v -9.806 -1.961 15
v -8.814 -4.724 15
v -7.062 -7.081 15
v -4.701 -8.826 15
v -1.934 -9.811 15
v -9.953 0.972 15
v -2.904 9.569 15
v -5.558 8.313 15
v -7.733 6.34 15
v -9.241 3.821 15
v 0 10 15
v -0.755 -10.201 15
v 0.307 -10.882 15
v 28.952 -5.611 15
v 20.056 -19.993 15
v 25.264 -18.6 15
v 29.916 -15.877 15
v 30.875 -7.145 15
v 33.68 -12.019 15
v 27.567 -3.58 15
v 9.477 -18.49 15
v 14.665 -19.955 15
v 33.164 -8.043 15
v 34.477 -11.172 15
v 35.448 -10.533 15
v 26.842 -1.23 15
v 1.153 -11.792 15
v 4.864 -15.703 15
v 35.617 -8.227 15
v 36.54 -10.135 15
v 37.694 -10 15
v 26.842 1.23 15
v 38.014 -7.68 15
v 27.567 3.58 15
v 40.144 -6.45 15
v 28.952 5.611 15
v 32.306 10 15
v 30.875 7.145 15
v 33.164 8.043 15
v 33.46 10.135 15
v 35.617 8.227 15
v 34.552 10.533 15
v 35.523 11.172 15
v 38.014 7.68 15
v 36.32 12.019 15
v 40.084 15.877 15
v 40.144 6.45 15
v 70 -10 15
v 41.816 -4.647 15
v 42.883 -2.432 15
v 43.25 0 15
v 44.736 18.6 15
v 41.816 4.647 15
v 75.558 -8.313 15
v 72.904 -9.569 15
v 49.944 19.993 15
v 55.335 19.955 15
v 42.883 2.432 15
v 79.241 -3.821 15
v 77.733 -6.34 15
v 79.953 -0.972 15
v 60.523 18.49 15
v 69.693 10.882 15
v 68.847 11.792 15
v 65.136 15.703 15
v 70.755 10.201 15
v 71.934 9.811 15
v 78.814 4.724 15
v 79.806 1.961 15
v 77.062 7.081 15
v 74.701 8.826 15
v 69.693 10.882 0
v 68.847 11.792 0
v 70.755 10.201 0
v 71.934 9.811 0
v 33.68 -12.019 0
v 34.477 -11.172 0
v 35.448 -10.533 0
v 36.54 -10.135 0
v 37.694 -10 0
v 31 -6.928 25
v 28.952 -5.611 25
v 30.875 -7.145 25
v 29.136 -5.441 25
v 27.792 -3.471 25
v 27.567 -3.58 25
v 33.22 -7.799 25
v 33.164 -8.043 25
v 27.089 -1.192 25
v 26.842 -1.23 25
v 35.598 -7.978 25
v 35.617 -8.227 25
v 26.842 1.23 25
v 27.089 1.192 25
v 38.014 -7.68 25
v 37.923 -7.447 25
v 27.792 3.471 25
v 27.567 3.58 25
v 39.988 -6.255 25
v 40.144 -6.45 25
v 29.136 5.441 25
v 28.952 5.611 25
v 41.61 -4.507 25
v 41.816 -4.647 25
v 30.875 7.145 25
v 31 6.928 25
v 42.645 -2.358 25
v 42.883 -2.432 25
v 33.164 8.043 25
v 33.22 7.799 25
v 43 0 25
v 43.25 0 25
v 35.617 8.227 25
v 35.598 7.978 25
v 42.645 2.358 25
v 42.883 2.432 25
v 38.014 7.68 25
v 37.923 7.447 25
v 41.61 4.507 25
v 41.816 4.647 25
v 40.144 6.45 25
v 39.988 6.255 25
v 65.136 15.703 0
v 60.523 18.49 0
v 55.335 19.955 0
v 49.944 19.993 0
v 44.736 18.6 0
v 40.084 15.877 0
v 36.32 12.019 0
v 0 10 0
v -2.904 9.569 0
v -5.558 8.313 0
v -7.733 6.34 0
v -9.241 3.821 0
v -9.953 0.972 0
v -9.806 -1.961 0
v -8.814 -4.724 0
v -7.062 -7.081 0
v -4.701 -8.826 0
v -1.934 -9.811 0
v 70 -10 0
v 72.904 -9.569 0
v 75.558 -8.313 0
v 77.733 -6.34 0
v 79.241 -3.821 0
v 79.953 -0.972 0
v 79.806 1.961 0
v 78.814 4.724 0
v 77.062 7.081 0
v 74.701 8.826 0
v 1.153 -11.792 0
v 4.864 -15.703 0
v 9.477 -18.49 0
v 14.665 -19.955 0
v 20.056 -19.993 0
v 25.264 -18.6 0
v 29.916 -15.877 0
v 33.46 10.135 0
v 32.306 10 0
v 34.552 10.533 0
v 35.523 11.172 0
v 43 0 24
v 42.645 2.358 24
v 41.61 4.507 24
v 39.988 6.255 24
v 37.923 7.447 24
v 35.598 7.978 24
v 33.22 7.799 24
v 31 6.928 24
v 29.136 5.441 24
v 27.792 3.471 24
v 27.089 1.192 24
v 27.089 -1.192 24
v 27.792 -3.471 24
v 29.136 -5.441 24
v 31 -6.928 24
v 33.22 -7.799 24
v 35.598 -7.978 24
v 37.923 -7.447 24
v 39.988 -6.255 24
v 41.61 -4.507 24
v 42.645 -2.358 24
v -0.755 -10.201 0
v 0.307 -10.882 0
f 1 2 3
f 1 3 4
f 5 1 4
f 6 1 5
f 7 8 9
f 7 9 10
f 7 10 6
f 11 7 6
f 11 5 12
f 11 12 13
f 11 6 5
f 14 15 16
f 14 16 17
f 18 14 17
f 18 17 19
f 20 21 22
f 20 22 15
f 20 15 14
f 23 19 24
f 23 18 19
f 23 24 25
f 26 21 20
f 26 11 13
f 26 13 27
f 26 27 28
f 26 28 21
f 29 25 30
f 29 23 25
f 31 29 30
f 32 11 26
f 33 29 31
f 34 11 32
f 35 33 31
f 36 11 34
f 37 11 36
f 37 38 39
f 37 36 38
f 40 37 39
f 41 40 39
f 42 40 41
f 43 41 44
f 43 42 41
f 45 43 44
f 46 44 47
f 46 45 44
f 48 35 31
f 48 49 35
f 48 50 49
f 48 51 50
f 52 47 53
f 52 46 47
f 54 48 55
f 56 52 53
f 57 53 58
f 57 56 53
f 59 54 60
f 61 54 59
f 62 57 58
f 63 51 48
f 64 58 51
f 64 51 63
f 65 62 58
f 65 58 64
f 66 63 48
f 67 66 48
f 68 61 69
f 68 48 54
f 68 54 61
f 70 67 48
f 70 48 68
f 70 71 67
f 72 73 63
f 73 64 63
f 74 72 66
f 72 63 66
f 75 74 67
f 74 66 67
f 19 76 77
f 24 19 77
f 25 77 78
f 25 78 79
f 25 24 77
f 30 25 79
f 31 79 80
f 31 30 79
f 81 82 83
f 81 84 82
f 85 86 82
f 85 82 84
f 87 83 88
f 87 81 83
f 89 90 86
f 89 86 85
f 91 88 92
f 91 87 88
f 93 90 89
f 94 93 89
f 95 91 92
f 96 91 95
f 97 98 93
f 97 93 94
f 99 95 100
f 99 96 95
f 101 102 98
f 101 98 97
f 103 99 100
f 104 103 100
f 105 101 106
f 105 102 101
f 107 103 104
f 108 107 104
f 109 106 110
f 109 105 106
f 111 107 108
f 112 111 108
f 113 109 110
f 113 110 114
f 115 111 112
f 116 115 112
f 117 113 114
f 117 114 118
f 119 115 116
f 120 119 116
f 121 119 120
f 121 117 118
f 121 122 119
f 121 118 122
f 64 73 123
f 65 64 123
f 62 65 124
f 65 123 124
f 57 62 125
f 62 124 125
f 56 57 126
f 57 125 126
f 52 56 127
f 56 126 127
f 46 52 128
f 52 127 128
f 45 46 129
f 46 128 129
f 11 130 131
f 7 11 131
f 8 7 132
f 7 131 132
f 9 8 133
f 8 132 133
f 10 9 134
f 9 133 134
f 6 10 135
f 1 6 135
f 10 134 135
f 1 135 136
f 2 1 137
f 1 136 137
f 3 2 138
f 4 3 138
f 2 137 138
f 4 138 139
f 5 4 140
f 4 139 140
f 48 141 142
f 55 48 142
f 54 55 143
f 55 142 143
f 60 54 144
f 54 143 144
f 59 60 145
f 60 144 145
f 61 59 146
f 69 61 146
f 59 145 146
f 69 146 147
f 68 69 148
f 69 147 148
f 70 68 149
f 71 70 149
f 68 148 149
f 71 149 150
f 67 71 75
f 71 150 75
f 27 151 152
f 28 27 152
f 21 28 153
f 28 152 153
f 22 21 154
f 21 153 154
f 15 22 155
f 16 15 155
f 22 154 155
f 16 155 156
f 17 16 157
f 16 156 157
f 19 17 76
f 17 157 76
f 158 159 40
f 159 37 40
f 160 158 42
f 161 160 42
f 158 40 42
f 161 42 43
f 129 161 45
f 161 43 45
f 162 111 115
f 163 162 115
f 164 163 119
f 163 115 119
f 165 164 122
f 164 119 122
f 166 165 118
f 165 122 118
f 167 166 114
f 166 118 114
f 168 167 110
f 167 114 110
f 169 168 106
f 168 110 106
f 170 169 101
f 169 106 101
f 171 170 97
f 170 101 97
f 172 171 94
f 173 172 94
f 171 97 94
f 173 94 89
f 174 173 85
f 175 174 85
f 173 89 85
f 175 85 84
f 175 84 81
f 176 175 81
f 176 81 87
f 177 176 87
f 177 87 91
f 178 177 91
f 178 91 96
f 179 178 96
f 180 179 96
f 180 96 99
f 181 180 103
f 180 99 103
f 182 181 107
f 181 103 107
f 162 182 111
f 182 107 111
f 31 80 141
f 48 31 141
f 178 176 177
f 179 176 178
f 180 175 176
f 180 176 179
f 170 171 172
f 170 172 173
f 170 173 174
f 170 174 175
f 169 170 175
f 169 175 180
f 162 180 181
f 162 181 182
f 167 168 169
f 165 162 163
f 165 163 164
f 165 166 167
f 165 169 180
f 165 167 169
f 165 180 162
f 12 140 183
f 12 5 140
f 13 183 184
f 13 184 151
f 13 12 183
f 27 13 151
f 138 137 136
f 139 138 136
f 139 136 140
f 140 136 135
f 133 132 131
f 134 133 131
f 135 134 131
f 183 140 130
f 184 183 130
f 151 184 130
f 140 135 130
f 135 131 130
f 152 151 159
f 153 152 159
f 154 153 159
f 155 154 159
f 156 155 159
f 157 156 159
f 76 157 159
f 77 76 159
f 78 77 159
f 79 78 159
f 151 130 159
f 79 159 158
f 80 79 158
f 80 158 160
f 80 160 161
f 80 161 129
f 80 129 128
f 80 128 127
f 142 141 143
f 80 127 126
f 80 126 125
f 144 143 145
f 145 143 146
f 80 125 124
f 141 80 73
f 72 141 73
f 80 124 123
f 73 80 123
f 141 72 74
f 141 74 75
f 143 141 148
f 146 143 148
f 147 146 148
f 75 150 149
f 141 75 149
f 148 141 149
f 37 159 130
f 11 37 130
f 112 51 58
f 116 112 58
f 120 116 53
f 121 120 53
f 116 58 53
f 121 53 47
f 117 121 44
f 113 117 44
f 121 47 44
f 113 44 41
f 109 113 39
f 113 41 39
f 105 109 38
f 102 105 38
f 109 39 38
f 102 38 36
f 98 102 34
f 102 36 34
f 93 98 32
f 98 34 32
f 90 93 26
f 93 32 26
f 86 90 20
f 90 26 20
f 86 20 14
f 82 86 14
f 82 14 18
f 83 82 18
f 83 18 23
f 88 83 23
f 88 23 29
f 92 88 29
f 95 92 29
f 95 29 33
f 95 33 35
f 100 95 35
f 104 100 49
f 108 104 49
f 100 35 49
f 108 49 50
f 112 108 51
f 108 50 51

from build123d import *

# Parameters (mm, degrees)
BOSS_EXTRUDE5_DEPTH = 15
SKETCH5_R           = 8.25
BOSS_EXTRUDE6_DEPTH = 10
SKETCH6_R           = 8
CUT_EXTRUDE2_DEPTH  = 1
FILLET3_R           = 5


with BuildPart() as part:
    # Sketch1 → Boss-Extrude5 (new body)
    with BuildSketch(Plane.XY):
        with BuildLine():
            Line((35, 10), (0, 10))
            ThreePointArc((0, 10), (-10, 0), (0, -10))
            Line((0, -10), (35, -10))
            Line((35, -10), (70, -10))
            ThreePointArc((70, -10), (80, 0), (70, 10))
            Line((70, 10), (35, 10))
        make_face()
        with BuildLine():
            ThreePointArc((70, 10), (52.5, 20.155644371), (35, 10))
            Line((35, 10), (70, 10))
        make_face()
        with BuildLine():
            Line((35, -10), (0, -10))
            ThreePointArc((0, -10), (17.5, -20.155644371), (35, -10))
        make_face()
    extrude(amount=BOSS_EXTRUDE5_DEPTH)

    # Sketch5 → Boss-Extrude6 (add)
    with BuildSketch(Plane.XY.offset(15)):
        with Locations((35, 0)):
            Circle(SKETCH5_R)
    extrude(amount=BOSS_EXTRUDE6_DEPTH)

    # Sketch6 → Cut-Extrude2 (cut)
    with BuildSketch(Plane.XY.offset(25)):
        with Locations((35, 0)):
            Circle(SKETCH6_R)
    extrude(amount=-CUT_EXTRUDE2_DEPTH, mode=Mode.SUBTRACT)

    # Fillet3
    fillet3_edges = [part.edges().sort_by_distance(p)[0] for p in [
        (35, -10, 7.5),
        (0, -10, 7.5),
        (35, 10, 7.5),
        (70, 10, 7.5),
    ]]
    fillet(fillet3_edges, radius=FILLET3_R)


solid = part.part
